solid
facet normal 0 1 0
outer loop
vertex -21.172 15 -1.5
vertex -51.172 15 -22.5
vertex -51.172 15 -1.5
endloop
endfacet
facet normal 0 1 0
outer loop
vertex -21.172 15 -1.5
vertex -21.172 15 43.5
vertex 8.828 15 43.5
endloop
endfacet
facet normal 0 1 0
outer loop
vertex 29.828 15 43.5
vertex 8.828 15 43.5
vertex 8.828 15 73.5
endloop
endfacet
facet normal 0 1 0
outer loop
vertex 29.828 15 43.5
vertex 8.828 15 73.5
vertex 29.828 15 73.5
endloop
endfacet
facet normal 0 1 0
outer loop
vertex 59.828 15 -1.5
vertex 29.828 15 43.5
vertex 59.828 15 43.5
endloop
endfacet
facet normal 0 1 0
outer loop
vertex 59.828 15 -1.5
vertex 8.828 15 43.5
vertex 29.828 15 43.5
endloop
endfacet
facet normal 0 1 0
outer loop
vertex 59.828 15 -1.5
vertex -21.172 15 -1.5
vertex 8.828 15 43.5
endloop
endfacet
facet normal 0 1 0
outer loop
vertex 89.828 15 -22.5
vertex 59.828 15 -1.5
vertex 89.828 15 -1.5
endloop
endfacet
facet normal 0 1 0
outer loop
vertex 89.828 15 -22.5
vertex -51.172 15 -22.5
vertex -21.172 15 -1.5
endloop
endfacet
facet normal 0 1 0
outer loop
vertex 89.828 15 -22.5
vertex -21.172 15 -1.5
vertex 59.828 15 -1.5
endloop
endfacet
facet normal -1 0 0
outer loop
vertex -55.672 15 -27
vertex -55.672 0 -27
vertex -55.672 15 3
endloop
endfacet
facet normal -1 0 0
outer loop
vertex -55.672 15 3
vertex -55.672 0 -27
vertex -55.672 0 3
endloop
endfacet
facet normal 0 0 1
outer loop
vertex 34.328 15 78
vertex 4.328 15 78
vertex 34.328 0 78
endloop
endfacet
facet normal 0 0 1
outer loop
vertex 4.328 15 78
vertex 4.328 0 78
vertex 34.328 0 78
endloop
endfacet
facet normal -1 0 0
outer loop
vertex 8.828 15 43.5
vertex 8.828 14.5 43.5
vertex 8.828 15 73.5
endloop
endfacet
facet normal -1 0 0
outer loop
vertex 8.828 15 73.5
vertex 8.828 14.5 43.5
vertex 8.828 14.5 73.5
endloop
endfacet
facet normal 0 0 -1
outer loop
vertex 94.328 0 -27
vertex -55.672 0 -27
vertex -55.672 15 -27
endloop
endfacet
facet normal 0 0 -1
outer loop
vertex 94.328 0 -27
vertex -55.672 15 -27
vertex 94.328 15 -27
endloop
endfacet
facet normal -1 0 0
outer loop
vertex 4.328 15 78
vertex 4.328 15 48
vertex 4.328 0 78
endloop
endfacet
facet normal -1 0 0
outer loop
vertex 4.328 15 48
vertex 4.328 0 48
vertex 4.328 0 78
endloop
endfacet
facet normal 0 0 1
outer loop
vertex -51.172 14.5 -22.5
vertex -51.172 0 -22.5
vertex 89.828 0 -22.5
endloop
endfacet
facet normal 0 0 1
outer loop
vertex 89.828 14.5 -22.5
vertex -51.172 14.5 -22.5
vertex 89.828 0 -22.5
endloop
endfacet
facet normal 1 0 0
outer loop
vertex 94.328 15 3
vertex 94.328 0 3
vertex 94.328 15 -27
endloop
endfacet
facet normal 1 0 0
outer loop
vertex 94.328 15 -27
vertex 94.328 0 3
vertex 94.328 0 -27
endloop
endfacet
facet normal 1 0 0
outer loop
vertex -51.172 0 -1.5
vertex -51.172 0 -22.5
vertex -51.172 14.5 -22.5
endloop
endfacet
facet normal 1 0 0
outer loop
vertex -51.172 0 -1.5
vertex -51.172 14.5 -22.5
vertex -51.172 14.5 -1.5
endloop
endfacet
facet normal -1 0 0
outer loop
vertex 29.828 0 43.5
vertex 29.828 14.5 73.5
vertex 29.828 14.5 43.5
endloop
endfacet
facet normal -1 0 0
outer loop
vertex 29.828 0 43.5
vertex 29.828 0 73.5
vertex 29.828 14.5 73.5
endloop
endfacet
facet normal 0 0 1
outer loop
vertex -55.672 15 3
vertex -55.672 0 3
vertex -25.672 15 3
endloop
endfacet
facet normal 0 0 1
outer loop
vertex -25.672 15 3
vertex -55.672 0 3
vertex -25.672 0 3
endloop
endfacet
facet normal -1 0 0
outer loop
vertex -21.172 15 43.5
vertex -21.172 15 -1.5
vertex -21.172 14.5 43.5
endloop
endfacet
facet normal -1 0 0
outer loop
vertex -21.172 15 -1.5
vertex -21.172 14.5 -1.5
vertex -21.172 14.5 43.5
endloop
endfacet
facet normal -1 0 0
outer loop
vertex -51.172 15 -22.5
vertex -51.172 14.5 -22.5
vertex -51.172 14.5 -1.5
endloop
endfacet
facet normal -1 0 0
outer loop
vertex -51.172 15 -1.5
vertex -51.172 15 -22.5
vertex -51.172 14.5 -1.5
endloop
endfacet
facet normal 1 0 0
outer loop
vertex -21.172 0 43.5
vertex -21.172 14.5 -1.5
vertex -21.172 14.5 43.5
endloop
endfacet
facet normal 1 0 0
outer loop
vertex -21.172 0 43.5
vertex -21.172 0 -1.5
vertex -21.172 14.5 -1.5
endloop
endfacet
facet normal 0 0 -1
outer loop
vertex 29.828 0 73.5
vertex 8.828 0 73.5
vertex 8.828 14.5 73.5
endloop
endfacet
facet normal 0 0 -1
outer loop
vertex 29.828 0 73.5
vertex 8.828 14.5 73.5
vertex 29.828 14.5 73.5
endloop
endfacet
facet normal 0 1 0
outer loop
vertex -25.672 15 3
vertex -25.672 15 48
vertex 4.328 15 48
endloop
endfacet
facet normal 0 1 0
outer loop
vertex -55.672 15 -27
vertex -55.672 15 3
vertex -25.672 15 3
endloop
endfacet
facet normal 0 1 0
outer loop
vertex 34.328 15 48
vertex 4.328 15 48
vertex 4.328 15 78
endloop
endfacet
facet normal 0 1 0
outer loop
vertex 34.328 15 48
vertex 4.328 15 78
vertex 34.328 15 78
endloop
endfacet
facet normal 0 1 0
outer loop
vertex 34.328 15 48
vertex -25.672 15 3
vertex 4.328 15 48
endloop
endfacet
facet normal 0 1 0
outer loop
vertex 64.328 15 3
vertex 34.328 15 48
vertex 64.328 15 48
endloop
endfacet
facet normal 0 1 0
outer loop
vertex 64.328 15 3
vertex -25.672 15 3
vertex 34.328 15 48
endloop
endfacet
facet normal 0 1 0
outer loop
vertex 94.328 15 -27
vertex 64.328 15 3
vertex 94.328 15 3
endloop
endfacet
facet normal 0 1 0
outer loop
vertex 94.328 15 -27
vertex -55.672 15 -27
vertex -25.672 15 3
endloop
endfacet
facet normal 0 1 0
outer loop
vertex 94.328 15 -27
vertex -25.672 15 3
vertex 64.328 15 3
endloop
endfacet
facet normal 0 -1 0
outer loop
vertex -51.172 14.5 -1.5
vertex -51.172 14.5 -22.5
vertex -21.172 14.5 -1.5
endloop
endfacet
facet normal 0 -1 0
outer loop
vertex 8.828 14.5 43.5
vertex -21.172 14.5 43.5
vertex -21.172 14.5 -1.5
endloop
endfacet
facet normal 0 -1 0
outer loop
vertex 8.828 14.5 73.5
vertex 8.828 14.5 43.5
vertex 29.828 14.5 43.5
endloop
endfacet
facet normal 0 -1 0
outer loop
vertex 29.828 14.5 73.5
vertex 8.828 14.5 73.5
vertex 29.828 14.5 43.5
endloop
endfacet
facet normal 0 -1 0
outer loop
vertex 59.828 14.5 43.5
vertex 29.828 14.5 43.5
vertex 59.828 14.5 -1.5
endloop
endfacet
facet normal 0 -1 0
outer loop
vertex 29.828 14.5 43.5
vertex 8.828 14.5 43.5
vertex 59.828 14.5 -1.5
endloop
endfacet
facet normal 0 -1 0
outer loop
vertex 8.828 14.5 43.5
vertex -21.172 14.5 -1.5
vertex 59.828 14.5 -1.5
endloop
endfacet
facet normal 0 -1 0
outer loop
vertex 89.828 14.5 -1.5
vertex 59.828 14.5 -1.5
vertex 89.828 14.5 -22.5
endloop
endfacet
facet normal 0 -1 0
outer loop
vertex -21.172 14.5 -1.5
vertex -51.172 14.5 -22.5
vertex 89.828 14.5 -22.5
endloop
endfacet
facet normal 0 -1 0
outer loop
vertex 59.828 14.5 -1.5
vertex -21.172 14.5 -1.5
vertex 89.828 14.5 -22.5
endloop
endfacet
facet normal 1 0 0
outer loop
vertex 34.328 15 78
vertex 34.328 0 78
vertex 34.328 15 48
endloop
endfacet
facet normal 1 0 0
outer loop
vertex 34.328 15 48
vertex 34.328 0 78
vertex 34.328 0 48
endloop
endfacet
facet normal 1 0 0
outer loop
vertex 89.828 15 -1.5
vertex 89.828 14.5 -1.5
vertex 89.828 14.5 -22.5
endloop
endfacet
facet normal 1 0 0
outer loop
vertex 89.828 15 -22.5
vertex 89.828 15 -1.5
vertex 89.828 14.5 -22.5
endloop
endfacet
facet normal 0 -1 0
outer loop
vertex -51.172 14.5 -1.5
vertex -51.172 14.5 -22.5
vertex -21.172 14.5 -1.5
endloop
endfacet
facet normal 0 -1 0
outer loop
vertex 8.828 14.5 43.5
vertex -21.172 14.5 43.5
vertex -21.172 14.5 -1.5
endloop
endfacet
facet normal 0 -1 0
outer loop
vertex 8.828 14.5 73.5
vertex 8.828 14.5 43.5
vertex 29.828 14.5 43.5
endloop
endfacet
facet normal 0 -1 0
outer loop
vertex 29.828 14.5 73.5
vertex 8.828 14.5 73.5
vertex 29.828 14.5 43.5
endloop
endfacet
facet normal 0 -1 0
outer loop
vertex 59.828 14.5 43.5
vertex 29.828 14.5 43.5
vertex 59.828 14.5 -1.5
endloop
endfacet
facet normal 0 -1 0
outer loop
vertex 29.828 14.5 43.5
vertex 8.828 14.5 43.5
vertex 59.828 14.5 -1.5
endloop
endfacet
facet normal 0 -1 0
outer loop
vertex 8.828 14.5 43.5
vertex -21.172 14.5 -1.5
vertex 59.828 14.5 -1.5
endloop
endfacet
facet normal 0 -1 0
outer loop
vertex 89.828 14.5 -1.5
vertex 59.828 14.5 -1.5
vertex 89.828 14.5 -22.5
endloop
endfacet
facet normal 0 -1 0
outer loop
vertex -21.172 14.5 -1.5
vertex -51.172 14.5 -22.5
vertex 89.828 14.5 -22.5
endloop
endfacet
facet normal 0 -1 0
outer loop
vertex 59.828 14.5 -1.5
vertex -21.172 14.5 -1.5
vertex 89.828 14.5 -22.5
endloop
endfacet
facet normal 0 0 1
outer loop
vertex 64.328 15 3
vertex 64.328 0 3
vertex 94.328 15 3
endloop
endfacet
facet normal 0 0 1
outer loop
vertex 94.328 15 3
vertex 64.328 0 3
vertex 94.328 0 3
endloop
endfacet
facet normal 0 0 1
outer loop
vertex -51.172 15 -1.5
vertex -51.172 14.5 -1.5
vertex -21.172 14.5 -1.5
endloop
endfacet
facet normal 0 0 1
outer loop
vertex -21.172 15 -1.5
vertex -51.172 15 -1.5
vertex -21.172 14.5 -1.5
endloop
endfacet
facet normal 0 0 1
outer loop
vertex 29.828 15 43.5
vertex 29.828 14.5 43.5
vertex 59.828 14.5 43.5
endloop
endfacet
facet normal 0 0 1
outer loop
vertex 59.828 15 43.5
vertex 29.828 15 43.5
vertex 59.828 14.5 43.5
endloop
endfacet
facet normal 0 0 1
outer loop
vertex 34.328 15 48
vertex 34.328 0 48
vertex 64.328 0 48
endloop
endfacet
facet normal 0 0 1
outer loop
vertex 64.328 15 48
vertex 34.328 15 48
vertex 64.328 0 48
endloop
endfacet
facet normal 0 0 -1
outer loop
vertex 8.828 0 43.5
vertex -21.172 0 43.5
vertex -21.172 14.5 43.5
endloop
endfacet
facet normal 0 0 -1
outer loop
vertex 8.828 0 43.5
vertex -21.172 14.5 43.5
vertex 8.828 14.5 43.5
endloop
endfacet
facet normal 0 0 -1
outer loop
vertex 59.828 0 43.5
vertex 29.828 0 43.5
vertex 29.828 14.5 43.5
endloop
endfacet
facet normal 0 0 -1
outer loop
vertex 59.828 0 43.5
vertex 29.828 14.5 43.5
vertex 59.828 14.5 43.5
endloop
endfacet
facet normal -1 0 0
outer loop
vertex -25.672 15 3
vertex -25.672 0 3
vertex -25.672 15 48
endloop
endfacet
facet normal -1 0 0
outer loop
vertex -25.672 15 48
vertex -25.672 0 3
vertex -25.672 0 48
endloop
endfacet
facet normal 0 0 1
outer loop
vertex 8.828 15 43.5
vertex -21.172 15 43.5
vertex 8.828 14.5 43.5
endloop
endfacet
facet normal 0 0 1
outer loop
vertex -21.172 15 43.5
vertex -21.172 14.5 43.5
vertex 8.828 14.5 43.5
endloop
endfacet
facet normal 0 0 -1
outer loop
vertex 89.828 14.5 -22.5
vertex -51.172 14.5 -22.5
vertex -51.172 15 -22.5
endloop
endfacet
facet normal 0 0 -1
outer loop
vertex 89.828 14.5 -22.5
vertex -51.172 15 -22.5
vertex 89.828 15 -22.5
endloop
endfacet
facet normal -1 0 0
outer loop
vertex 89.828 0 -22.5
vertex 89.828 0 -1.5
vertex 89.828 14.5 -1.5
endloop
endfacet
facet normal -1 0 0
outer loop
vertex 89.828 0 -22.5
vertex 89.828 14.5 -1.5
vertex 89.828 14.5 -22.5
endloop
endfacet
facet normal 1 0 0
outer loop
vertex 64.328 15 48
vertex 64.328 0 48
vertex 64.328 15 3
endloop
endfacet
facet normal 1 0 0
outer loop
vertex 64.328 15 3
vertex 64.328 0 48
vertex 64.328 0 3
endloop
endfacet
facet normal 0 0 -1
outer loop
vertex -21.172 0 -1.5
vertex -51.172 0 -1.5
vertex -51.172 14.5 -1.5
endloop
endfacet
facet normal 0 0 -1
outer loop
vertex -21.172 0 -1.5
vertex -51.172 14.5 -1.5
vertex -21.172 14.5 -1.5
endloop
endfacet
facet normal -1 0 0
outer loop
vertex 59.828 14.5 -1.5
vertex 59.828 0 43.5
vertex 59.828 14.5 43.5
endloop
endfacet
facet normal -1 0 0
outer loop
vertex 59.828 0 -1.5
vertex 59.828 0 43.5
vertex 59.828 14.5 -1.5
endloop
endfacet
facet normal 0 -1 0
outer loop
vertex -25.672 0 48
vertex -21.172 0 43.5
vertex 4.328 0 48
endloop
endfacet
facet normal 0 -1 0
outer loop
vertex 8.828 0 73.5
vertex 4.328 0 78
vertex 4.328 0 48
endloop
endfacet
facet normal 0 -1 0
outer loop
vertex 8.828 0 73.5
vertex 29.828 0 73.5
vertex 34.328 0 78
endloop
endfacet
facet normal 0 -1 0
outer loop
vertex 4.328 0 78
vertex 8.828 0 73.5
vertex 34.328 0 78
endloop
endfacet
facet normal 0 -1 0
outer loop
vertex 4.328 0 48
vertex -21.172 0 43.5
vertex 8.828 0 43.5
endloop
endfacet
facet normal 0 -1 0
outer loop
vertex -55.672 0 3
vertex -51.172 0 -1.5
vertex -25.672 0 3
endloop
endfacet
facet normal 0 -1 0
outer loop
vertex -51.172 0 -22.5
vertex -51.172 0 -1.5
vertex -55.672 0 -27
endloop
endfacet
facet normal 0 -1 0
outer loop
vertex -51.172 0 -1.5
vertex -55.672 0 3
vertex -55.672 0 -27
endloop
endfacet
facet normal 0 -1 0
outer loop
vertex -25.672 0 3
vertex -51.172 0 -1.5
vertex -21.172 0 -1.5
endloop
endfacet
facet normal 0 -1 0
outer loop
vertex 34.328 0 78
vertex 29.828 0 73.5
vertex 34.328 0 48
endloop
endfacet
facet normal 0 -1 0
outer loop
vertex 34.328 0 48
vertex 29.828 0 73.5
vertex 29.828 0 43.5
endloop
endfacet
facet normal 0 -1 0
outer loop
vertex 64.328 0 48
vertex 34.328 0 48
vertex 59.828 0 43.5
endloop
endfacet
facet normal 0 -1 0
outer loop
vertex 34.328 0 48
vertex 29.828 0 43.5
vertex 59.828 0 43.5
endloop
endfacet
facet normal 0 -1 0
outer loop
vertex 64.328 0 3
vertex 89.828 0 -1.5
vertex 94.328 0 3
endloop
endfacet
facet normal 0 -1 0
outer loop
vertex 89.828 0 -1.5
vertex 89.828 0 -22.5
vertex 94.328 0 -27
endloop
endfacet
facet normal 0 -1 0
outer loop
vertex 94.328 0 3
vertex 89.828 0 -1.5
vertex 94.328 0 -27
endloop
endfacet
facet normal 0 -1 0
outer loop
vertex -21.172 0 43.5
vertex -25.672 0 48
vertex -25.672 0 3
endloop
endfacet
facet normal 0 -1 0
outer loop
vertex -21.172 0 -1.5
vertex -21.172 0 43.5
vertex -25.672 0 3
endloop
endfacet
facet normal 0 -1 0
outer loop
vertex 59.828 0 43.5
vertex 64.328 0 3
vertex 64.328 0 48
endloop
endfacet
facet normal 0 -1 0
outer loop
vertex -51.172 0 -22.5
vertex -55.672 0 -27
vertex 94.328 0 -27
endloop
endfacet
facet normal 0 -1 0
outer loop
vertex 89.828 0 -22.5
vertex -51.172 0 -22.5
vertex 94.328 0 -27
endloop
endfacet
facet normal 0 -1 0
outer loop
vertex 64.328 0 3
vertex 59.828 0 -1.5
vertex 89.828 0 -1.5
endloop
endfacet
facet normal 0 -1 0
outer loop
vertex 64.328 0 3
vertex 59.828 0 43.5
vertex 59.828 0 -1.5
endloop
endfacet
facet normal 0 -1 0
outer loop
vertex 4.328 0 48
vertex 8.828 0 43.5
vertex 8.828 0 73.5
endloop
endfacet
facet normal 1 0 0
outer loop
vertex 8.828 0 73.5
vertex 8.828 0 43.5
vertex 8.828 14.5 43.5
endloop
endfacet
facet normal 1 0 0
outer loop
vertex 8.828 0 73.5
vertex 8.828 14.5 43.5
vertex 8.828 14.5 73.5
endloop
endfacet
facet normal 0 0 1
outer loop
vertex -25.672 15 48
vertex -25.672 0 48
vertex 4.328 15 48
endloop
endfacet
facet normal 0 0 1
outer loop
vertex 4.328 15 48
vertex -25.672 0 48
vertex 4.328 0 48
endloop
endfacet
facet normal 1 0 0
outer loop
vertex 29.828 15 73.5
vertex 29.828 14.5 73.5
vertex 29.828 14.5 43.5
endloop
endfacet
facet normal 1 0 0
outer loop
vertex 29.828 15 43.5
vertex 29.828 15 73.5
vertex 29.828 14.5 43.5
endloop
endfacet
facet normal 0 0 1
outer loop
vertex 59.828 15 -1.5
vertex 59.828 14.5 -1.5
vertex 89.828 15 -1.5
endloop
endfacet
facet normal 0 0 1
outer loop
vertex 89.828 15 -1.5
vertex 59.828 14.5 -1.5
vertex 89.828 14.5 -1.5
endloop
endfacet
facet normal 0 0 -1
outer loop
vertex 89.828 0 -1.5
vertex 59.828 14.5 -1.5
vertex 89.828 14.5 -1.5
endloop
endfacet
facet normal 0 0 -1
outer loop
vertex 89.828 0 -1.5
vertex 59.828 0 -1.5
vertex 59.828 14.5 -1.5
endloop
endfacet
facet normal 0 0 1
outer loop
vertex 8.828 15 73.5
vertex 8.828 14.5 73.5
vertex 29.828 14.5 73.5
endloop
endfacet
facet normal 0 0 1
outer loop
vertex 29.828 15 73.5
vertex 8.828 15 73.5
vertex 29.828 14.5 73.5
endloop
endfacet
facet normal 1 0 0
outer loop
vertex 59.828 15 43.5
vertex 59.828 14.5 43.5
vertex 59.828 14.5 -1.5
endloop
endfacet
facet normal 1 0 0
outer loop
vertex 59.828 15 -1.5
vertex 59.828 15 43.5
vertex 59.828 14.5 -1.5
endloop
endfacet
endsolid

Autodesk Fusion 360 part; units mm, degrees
sketch "Sketch1" plane through (0, 0, 0) normal (0, 1, 0) x (1, 0, 0)
  line L0 (-55.6722, 27.0003) -> (-55.6722, -2.9997)
  line L1 (-55.6722, -2.9997) -> (-25.6722, -2.9997)
  line L2 (-25.6722, -2.9997) -> (-25.6722, -47.9997)
  line L3 (-25.6722, -47.9997) -> (4.3278, -47.9997)
  line L4 (4.3278, -47.9997) -> (4.3278, -77.9997)
  line L5 (4.3278, -77.9997) -> (34.3278, -77.9997)
  line L6 (34.3278, -77.9997) -> (34.3278, -47.9997)
  line L7 (34.3278, -47.9997) -> (64.3278, -47.9997)
  line L8 (64.3278, -47.9997) -> (64.3278, -2.9997)
  line L9 (64.3278, -2.9997) -> (94.3278, -2.9997)
  line L10 (94.3278, -2.9997) -> (94.3278, 27.0003)
  line L11 (-55.6722, 27.0003) -> (94.3278, 27.0003)
  dimension "d1" = 150
  dimension "d2" = 30
  dimension "d3" = 30
  dimension "d4" = 30
  dimension "d5" = 30
  dimension "d6" = 30
  dimension "d7" = 45
  dimension "d8" = 30
  dimension "d9" = 30
  dimension "d10" = 45
extrude "Extrude1" add sketch "Sketch1" along normal blind 15 makes body 1
move_face "OffsetFaces1" offset -4.5 12 faces at (34.3278, 10, 67.9997) (64.3278, 10, 32.9997) (44.3278, 5, 47.9997) (74.3278, 10, 2.9997) (94.3278, 10, -7.0003) (-45.6722, 10, 2.9997) (-15.6722, 10, 47.9997) (14.3278, 10, 77.9997) (4.3278, 10, 57.9997) (-25.6722, 10, 17.9997) (-55.6722, 10, -17.0003) (-5.6722, 5, -27.0003) on bodies 1
extrude "Extrude2" add sketch "Sketch1" along normal blind 15 separate body makes body 2
extrude "Extrude3" cut 1 faces at (22.8278, 0, 13.4997) along direction (0, 1, 0) blind 14.5 on bodies 1 bodies 1 2
